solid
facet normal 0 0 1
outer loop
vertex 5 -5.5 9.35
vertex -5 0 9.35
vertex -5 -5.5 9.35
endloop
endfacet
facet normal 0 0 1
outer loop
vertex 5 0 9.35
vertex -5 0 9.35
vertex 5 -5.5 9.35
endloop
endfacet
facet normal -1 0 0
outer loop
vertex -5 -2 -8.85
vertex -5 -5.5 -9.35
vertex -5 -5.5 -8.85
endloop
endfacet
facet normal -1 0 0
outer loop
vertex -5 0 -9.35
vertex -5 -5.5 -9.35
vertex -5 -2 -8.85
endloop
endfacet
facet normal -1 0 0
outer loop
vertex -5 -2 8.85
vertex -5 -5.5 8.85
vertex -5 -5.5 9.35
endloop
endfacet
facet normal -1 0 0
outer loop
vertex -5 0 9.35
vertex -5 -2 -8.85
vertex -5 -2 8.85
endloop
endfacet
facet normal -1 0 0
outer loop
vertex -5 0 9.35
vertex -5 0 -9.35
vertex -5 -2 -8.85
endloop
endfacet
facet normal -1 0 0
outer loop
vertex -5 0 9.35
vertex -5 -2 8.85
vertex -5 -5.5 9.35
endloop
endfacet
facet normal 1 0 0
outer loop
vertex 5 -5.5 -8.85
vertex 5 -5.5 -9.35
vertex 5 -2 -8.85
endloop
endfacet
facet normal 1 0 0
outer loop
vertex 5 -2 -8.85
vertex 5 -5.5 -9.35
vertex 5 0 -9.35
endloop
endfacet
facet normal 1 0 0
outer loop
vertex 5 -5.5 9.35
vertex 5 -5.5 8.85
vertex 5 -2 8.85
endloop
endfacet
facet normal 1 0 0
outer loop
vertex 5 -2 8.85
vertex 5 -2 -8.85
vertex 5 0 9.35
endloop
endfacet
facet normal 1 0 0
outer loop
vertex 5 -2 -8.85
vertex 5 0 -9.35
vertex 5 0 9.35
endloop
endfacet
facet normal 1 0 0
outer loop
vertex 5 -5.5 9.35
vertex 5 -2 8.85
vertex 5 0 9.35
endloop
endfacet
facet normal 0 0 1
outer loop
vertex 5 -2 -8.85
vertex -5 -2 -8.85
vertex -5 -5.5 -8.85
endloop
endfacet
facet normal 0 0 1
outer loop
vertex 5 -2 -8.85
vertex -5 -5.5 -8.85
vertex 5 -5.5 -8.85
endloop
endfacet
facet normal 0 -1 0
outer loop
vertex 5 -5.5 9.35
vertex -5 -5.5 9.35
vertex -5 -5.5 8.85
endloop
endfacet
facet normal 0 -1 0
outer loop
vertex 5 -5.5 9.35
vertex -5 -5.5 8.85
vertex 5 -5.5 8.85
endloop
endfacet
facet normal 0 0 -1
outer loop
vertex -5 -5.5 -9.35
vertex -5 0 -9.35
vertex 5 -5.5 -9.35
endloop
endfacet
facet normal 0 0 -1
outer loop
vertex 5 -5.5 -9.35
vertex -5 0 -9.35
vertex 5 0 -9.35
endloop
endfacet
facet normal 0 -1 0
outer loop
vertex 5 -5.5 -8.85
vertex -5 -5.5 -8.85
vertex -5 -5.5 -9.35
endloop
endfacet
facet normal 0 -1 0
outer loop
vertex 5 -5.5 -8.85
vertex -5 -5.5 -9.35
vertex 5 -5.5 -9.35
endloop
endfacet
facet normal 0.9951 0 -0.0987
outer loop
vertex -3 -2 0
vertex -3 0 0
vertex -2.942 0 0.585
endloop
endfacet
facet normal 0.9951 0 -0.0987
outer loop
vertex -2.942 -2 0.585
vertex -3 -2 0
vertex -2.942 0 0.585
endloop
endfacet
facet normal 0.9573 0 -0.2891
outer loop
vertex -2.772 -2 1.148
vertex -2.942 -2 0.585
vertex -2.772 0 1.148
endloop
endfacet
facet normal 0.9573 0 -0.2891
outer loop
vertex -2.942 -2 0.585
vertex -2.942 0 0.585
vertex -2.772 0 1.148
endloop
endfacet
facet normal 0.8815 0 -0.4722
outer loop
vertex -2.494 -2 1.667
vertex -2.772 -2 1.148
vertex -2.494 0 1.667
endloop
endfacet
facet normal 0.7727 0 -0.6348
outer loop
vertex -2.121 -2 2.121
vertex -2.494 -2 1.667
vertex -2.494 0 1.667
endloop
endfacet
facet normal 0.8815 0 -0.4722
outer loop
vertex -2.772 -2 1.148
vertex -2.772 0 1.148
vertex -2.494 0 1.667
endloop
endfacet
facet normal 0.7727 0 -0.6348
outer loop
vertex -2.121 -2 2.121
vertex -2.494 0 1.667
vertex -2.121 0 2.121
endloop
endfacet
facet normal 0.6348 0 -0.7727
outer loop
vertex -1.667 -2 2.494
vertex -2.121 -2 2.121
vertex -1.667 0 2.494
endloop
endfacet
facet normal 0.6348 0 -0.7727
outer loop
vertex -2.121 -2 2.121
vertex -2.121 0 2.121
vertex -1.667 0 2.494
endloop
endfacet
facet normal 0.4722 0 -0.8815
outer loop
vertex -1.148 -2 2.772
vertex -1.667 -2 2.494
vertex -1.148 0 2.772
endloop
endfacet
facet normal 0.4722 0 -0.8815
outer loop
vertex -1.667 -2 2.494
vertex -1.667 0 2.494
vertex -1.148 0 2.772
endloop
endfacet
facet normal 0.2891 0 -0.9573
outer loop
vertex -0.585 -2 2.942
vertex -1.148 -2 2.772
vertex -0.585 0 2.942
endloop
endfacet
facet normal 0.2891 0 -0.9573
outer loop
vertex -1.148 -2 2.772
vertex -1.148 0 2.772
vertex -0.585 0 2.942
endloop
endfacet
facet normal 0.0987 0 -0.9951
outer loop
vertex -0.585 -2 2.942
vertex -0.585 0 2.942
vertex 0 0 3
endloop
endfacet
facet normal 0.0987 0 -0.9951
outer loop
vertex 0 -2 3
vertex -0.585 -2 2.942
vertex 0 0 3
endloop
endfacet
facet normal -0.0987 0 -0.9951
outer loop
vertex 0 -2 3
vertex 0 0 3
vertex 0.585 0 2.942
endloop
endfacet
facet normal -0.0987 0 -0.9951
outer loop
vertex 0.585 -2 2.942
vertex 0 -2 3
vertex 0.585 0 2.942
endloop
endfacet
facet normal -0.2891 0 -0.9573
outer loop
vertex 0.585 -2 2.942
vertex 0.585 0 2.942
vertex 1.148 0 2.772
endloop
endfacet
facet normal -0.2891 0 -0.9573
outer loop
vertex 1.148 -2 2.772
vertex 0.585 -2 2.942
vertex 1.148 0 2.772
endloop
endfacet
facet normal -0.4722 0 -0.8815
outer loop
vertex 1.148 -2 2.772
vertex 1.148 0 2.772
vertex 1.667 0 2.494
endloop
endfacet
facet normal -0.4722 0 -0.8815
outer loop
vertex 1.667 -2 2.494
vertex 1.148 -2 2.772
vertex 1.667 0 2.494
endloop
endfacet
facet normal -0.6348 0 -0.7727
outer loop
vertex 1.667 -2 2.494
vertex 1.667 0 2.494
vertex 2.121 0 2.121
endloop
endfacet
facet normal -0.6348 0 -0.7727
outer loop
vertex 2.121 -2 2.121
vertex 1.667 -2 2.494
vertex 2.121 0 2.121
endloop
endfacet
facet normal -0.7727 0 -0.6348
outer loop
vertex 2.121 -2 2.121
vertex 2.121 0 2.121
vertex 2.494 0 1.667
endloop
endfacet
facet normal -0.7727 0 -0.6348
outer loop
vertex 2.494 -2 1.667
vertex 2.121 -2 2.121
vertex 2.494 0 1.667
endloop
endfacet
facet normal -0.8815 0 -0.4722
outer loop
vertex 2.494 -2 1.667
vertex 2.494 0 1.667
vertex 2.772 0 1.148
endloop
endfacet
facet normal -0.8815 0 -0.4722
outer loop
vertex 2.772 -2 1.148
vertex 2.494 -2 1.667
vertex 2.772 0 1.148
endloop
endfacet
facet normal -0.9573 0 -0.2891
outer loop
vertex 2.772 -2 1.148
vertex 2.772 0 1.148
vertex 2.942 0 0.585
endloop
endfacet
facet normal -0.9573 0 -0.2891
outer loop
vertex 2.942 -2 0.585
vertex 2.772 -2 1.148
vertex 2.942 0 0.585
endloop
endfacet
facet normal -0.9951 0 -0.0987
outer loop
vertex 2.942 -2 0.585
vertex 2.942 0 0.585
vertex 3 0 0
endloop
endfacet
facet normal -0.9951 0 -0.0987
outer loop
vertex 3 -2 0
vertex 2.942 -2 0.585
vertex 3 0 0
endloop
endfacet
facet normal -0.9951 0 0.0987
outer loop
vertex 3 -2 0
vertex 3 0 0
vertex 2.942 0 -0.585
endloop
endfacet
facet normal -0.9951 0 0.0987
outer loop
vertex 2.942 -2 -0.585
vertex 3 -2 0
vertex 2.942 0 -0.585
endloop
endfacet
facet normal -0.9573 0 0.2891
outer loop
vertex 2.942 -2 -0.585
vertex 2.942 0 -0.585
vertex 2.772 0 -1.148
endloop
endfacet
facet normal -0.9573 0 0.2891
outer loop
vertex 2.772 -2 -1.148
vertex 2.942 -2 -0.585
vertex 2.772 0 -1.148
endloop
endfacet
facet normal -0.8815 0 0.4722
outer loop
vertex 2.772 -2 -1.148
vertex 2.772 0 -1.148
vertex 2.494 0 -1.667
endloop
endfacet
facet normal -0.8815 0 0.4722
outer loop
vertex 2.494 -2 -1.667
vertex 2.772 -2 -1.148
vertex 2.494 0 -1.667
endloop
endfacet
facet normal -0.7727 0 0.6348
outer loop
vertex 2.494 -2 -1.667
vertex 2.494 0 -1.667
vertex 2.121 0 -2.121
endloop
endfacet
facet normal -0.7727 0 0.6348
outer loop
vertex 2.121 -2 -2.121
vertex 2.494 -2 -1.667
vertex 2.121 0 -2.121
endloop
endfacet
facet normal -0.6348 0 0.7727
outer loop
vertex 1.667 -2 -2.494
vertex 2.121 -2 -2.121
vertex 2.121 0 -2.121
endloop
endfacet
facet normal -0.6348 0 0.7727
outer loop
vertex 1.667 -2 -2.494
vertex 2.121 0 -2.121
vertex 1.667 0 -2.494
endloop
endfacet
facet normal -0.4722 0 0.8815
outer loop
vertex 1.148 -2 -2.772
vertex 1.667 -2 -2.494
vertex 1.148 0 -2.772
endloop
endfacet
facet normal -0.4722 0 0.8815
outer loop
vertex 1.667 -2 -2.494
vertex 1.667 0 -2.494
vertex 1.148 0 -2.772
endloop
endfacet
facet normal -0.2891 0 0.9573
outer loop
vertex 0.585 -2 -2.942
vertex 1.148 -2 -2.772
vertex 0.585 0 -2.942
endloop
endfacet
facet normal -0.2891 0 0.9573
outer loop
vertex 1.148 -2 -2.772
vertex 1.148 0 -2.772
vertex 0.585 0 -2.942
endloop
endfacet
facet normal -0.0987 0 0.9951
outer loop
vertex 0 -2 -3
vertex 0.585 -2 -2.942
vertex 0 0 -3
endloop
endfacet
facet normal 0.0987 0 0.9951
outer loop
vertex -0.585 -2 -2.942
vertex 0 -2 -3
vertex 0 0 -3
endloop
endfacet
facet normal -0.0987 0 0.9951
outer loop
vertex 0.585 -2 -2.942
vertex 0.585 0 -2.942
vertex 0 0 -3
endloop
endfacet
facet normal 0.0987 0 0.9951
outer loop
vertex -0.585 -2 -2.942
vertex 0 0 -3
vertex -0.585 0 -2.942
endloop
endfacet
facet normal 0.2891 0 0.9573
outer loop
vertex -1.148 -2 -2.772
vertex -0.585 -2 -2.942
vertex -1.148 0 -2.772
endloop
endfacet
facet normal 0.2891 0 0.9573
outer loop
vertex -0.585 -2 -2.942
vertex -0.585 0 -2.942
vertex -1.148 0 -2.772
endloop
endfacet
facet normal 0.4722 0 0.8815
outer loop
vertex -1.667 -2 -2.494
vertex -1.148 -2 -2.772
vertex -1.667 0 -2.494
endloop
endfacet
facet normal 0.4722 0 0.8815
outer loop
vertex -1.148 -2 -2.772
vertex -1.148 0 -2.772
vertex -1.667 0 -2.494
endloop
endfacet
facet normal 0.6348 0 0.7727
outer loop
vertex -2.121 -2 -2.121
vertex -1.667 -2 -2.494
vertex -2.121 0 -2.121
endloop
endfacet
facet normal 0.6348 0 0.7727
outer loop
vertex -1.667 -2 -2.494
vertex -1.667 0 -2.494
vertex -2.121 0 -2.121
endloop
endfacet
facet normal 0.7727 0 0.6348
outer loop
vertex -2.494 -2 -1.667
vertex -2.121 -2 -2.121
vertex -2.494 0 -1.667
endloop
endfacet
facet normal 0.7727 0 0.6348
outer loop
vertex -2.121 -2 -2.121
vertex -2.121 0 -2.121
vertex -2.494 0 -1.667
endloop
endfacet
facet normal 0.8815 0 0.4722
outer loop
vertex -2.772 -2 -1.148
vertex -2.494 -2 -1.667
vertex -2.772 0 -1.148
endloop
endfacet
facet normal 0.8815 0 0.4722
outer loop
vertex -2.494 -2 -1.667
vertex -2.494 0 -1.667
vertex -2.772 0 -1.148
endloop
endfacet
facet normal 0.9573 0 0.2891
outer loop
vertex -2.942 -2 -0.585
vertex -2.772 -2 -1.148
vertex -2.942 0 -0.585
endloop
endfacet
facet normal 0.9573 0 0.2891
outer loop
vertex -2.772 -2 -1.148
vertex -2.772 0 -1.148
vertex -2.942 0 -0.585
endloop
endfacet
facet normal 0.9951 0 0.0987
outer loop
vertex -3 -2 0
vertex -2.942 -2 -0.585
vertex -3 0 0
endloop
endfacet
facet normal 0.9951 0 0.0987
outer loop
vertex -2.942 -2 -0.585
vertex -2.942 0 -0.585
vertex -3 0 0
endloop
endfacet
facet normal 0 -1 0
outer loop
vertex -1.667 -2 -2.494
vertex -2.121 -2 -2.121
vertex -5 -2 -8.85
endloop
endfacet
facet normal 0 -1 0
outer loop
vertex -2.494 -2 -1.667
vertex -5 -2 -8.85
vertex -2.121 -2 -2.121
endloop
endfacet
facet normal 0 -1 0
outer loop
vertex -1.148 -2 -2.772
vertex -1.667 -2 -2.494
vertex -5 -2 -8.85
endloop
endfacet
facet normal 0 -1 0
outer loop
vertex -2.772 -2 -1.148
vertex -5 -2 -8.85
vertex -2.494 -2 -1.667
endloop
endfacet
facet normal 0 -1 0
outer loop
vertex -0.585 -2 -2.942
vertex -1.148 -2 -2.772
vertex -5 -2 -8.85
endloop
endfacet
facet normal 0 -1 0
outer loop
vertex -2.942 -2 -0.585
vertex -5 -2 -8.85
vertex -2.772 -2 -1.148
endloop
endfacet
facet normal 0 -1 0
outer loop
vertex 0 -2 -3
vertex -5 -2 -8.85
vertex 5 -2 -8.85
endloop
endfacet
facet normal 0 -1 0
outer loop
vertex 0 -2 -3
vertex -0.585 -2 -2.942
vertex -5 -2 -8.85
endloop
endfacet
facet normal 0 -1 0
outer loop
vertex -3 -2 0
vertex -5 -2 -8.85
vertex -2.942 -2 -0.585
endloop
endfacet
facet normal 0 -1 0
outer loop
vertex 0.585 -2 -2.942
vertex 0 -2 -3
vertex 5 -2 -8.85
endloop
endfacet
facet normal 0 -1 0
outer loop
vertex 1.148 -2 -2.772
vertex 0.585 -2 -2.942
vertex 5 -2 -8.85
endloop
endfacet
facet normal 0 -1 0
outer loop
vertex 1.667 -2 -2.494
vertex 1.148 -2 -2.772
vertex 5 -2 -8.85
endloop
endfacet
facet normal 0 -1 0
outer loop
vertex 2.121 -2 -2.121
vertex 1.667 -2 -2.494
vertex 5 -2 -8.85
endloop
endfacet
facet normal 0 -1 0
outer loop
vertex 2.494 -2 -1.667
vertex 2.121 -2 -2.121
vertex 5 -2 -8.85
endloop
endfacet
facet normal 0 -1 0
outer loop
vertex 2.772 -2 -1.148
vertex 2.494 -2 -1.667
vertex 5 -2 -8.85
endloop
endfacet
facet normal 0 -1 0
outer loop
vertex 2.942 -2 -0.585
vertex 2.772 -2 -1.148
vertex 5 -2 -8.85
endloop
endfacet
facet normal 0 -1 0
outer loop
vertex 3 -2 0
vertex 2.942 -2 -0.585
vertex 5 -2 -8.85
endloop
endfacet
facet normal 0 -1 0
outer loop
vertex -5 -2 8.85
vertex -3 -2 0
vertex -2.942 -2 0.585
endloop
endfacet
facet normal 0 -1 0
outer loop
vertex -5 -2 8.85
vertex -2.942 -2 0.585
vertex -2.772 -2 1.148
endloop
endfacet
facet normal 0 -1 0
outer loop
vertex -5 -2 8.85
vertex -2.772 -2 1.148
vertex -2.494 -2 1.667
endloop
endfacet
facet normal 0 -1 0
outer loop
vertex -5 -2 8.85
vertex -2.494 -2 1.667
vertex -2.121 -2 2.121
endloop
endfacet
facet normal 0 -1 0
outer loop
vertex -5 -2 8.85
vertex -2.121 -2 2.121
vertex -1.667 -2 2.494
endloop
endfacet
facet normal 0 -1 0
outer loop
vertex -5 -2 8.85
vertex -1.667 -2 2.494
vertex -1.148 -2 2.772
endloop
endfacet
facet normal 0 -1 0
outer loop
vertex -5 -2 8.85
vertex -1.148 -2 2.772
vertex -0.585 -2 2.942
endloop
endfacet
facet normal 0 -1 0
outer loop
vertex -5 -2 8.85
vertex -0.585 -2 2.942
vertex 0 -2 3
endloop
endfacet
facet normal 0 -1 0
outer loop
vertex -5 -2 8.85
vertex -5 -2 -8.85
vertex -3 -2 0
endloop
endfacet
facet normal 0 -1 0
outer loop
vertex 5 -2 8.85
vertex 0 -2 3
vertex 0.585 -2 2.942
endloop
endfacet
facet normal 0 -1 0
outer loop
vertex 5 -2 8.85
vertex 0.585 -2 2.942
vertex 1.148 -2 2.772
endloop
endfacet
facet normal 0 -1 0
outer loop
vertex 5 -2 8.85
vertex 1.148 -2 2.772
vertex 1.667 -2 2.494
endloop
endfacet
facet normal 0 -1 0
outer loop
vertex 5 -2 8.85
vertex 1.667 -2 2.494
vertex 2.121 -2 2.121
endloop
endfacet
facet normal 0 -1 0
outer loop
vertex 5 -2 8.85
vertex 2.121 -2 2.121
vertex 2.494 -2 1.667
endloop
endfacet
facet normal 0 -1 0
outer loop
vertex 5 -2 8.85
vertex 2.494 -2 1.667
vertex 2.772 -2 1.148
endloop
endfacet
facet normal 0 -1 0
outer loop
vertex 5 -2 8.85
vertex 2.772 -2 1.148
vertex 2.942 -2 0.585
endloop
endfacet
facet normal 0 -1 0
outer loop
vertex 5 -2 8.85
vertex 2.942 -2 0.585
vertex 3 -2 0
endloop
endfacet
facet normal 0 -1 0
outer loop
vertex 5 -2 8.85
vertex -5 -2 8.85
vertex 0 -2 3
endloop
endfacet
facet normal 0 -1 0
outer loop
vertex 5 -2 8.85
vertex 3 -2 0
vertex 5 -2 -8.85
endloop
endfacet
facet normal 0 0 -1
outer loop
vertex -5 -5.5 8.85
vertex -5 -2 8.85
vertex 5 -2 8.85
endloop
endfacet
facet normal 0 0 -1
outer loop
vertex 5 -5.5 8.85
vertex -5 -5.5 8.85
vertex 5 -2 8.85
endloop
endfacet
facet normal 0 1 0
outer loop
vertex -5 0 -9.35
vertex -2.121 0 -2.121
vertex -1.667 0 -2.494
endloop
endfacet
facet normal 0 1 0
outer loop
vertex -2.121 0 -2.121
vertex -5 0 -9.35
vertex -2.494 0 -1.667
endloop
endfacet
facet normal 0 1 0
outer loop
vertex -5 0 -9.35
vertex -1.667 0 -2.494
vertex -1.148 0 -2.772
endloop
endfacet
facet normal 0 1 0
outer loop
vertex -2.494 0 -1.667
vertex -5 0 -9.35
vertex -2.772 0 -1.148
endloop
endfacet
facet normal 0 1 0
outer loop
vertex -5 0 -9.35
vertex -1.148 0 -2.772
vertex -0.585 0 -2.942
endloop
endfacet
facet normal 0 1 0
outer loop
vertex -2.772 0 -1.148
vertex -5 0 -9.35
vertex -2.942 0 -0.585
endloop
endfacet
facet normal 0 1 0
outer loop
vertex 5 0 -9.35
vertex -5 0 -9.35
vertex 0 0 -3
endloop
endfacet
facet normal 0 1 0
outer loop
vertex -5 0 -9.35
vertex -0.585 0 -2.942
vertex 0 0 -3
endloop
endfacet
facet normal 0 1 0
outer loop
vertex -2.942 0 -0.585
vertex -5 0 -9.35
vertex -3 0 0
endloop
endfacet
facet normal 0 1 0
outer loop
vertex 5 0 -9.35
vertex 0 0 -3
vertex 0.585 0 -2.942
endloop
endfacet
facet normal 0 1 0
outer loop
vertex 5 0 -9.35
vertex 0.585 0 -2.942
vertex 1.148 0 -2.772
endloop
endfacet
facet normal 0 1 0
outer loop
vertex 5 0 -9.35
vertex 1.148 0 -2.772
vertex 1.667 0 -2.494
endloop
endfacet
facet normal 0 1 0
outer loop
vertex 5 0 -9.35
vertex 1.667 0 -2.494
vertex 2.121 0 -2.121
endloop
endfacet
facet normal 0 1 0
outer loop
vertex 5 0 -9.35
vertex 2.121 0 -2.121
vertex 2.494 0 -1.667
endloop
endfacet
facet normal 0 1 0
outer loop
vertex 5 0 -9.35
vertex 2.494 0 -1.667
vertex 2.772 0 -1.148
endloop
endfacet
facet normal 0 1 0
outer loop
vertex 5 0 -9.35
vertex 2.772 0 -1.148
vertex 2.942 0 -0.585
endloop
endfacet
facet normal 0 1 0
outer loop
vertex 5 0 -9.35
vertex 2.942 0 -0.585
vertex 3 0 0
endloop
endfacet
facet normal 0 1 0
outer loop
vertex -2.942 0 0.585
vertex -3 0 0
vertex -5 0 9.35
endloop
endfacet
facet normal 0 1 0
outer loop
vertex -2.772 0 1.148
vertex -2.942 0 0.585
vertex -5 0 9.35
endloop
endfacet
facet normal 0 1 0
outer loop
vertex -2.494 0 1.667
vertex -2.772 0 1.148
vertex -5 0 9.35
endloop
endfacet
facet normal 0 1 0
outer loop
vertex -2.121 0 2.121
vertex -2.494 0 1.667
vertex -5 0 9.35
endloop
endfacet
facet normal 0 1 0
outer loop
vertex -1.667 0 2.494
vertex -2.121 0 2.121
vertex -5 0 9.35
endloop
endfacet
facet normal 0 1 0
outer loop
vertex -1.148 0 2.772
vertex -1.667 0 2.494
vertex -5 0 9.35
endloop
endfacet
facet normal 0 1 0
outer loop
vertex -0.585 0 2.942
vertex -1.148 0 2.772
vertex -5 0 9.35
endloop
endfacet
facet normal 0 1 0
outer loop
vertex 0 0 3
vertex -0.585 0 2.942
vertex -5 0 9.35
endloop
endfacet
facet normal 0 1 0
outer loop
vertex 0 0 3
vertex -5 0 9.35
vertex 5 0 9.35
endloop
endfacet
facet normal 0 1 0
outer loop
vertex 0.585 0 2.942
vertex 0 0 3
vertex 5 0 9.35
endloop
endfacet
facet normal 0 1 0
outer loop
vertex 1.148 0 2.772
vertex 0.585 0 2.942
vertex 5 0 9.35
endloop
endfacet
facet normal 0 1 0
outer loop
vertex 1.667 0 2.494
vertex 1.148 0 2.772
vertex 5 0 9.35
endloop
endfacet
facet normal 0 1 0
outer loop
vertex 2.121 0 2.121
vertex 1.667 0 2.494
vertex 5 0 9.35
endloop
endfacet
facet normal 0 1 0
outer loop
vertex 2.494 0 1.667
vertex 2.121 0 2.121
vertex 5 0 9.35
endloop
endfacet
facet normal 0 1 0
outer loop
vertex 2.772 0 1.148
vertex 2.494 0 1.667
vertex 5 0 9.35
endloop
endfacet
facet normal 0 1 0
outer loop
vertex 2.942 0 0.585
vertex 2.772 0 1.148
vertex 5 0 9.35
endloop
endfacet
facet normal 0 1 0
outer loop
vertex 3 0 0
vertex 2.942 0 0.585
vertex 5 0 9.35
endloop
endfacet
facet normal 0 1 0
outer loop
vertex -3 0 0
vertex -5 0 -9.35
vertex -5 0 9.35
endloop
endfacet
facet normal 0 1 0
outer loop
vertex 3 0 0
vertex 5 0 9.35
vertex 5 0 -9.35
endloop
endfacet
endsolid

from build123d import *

# Parameters (mm, degrees)
F0_W     = 10
F0_H     = 18.7
F1_DEPTH = 2
F2_W     = 10
F2_H     = 0.5
F3_DEPTH = 3.5
F4_R     = 3
F5_DEPTH = 25


with BuildPart() as f1:
    # F0 (on Front) → F1 (new body)
    with BuildSketch(Plane.XZ):
        Rectangle(F0_W, F0_H)
    extrude(amount=F1_DEPTH)

    # F2 (on face) → F3 (join)
    with BuildSketch(Plane.XZ.offset(2)):
        with Locations((0, 9.1)):
            Rectangle(F2_W, F2_H)
        with Locations((0, -9.1)):
            Rectangle(F2_W, F2_H)
    extrude(amount=F3_DEPTH)

    # F4 (on face) → F5 (cut)
    with BuildSketch(Plane(origin=(0, 0, 0), x_dir=(-1, 0, 0), z_dir=(0, 1, 0))):
        Circle(F4_R)
    extrude(amount=-F5_DEPTH, mode=Mode.SUBTRACT)


solid = f1.part
